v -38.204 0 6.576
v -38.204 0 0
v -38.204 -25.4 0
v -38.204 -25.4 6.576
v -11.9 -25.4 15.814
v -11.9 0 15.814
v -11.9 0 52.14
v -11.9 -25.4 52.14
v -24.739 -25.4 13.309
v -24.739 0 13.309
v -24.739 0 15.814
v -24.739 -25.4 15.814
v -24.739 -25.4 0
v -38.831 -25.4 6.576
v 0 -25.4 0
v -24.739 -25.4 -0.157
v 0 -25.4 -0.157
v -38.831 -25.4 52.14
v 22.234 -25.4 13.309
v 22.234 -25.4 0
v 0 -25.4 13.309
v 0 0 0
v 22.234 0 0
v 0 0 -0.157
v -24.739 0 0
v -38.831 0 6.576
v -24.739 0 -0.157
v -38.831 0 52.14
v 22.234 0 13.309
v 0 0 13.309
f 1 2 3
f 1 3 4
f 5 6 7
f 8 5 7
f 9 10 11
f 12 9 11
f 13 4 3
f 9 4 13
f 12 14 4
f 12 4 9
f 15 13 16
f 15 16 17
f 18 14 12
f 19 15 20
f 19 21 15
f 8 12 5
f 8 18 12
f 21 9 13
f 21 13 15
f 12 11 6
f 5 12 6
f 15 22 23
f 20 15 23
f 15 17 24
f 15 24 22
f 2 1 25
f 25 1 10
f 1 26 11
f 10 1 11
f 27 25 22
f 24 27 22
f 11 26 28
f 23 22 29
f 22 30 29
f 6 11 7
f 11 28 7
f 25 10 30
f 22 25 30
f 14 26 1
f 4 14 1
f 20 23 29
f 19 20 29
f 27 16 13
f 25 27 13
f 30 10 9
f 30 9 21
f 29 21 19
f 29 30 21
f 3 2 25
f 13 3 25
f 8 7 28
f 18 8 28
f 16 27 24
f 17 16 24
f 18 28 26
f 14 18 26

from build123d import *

# Parameters (mm, degrees)
F0_W     = 13.4654790163
F0_H     = 6.7327402066
F0_H_2   = 6.5761648584
F0_W_2   = 22.2336961131
F0_H_3   = 13.3089050651
F0_W_3   = 24.73890463
F0_H_4   = 0.1565753482
F1_DEPTH = 25.4


with BuildPart() as f1:
    # F0 (on Front) → F1 (new body)
    with BuildSketch(Plane.XZ):
        Polygon((-38.204383105, 6.5761648584), (-38.204383105, 13.3089050651), (-24.7389040887, 13.3089050651), (-24.7389040887, 15.8141106367), (-38.8306863606, 15.8141106367), (-38.8306863606, 6.5761648584), align=None)
        with Locations((-31.4716435969, 9.9425349617)):
            Rectangle(F0_W, F0_H)
        Polygon((5.413e-07, 13.3089050651), (-24.7389040887, 13.3089050651), (-24.7389040887, 6.5761648584), (-24.7389040887, 0), (5.413e-07, 0), align=None)
        with Locations((-31.4716435969, 3.2880824292)):
            Rectangle(F0_W, F0_H_2)
        with Locations((11.1168485979, 6.6544525325)):
            Rectangle(F0_W_2, F0_H_3)
        Polygon((-38.8306863606, 15.8141106367), (-24.7389040887, 15.8141106367), (-11.899725534, 15.8141106367), (-11.899725534, 52.1395914257), (-38.8306863606, 52.1395914257), align=None)
        with Locations((-12.3694517737, -0.0782876741)):
            Rectangle(F0_W_3, F0_H_4)
    extrude(amount=F1_DEPTH)


solid = f1.part
